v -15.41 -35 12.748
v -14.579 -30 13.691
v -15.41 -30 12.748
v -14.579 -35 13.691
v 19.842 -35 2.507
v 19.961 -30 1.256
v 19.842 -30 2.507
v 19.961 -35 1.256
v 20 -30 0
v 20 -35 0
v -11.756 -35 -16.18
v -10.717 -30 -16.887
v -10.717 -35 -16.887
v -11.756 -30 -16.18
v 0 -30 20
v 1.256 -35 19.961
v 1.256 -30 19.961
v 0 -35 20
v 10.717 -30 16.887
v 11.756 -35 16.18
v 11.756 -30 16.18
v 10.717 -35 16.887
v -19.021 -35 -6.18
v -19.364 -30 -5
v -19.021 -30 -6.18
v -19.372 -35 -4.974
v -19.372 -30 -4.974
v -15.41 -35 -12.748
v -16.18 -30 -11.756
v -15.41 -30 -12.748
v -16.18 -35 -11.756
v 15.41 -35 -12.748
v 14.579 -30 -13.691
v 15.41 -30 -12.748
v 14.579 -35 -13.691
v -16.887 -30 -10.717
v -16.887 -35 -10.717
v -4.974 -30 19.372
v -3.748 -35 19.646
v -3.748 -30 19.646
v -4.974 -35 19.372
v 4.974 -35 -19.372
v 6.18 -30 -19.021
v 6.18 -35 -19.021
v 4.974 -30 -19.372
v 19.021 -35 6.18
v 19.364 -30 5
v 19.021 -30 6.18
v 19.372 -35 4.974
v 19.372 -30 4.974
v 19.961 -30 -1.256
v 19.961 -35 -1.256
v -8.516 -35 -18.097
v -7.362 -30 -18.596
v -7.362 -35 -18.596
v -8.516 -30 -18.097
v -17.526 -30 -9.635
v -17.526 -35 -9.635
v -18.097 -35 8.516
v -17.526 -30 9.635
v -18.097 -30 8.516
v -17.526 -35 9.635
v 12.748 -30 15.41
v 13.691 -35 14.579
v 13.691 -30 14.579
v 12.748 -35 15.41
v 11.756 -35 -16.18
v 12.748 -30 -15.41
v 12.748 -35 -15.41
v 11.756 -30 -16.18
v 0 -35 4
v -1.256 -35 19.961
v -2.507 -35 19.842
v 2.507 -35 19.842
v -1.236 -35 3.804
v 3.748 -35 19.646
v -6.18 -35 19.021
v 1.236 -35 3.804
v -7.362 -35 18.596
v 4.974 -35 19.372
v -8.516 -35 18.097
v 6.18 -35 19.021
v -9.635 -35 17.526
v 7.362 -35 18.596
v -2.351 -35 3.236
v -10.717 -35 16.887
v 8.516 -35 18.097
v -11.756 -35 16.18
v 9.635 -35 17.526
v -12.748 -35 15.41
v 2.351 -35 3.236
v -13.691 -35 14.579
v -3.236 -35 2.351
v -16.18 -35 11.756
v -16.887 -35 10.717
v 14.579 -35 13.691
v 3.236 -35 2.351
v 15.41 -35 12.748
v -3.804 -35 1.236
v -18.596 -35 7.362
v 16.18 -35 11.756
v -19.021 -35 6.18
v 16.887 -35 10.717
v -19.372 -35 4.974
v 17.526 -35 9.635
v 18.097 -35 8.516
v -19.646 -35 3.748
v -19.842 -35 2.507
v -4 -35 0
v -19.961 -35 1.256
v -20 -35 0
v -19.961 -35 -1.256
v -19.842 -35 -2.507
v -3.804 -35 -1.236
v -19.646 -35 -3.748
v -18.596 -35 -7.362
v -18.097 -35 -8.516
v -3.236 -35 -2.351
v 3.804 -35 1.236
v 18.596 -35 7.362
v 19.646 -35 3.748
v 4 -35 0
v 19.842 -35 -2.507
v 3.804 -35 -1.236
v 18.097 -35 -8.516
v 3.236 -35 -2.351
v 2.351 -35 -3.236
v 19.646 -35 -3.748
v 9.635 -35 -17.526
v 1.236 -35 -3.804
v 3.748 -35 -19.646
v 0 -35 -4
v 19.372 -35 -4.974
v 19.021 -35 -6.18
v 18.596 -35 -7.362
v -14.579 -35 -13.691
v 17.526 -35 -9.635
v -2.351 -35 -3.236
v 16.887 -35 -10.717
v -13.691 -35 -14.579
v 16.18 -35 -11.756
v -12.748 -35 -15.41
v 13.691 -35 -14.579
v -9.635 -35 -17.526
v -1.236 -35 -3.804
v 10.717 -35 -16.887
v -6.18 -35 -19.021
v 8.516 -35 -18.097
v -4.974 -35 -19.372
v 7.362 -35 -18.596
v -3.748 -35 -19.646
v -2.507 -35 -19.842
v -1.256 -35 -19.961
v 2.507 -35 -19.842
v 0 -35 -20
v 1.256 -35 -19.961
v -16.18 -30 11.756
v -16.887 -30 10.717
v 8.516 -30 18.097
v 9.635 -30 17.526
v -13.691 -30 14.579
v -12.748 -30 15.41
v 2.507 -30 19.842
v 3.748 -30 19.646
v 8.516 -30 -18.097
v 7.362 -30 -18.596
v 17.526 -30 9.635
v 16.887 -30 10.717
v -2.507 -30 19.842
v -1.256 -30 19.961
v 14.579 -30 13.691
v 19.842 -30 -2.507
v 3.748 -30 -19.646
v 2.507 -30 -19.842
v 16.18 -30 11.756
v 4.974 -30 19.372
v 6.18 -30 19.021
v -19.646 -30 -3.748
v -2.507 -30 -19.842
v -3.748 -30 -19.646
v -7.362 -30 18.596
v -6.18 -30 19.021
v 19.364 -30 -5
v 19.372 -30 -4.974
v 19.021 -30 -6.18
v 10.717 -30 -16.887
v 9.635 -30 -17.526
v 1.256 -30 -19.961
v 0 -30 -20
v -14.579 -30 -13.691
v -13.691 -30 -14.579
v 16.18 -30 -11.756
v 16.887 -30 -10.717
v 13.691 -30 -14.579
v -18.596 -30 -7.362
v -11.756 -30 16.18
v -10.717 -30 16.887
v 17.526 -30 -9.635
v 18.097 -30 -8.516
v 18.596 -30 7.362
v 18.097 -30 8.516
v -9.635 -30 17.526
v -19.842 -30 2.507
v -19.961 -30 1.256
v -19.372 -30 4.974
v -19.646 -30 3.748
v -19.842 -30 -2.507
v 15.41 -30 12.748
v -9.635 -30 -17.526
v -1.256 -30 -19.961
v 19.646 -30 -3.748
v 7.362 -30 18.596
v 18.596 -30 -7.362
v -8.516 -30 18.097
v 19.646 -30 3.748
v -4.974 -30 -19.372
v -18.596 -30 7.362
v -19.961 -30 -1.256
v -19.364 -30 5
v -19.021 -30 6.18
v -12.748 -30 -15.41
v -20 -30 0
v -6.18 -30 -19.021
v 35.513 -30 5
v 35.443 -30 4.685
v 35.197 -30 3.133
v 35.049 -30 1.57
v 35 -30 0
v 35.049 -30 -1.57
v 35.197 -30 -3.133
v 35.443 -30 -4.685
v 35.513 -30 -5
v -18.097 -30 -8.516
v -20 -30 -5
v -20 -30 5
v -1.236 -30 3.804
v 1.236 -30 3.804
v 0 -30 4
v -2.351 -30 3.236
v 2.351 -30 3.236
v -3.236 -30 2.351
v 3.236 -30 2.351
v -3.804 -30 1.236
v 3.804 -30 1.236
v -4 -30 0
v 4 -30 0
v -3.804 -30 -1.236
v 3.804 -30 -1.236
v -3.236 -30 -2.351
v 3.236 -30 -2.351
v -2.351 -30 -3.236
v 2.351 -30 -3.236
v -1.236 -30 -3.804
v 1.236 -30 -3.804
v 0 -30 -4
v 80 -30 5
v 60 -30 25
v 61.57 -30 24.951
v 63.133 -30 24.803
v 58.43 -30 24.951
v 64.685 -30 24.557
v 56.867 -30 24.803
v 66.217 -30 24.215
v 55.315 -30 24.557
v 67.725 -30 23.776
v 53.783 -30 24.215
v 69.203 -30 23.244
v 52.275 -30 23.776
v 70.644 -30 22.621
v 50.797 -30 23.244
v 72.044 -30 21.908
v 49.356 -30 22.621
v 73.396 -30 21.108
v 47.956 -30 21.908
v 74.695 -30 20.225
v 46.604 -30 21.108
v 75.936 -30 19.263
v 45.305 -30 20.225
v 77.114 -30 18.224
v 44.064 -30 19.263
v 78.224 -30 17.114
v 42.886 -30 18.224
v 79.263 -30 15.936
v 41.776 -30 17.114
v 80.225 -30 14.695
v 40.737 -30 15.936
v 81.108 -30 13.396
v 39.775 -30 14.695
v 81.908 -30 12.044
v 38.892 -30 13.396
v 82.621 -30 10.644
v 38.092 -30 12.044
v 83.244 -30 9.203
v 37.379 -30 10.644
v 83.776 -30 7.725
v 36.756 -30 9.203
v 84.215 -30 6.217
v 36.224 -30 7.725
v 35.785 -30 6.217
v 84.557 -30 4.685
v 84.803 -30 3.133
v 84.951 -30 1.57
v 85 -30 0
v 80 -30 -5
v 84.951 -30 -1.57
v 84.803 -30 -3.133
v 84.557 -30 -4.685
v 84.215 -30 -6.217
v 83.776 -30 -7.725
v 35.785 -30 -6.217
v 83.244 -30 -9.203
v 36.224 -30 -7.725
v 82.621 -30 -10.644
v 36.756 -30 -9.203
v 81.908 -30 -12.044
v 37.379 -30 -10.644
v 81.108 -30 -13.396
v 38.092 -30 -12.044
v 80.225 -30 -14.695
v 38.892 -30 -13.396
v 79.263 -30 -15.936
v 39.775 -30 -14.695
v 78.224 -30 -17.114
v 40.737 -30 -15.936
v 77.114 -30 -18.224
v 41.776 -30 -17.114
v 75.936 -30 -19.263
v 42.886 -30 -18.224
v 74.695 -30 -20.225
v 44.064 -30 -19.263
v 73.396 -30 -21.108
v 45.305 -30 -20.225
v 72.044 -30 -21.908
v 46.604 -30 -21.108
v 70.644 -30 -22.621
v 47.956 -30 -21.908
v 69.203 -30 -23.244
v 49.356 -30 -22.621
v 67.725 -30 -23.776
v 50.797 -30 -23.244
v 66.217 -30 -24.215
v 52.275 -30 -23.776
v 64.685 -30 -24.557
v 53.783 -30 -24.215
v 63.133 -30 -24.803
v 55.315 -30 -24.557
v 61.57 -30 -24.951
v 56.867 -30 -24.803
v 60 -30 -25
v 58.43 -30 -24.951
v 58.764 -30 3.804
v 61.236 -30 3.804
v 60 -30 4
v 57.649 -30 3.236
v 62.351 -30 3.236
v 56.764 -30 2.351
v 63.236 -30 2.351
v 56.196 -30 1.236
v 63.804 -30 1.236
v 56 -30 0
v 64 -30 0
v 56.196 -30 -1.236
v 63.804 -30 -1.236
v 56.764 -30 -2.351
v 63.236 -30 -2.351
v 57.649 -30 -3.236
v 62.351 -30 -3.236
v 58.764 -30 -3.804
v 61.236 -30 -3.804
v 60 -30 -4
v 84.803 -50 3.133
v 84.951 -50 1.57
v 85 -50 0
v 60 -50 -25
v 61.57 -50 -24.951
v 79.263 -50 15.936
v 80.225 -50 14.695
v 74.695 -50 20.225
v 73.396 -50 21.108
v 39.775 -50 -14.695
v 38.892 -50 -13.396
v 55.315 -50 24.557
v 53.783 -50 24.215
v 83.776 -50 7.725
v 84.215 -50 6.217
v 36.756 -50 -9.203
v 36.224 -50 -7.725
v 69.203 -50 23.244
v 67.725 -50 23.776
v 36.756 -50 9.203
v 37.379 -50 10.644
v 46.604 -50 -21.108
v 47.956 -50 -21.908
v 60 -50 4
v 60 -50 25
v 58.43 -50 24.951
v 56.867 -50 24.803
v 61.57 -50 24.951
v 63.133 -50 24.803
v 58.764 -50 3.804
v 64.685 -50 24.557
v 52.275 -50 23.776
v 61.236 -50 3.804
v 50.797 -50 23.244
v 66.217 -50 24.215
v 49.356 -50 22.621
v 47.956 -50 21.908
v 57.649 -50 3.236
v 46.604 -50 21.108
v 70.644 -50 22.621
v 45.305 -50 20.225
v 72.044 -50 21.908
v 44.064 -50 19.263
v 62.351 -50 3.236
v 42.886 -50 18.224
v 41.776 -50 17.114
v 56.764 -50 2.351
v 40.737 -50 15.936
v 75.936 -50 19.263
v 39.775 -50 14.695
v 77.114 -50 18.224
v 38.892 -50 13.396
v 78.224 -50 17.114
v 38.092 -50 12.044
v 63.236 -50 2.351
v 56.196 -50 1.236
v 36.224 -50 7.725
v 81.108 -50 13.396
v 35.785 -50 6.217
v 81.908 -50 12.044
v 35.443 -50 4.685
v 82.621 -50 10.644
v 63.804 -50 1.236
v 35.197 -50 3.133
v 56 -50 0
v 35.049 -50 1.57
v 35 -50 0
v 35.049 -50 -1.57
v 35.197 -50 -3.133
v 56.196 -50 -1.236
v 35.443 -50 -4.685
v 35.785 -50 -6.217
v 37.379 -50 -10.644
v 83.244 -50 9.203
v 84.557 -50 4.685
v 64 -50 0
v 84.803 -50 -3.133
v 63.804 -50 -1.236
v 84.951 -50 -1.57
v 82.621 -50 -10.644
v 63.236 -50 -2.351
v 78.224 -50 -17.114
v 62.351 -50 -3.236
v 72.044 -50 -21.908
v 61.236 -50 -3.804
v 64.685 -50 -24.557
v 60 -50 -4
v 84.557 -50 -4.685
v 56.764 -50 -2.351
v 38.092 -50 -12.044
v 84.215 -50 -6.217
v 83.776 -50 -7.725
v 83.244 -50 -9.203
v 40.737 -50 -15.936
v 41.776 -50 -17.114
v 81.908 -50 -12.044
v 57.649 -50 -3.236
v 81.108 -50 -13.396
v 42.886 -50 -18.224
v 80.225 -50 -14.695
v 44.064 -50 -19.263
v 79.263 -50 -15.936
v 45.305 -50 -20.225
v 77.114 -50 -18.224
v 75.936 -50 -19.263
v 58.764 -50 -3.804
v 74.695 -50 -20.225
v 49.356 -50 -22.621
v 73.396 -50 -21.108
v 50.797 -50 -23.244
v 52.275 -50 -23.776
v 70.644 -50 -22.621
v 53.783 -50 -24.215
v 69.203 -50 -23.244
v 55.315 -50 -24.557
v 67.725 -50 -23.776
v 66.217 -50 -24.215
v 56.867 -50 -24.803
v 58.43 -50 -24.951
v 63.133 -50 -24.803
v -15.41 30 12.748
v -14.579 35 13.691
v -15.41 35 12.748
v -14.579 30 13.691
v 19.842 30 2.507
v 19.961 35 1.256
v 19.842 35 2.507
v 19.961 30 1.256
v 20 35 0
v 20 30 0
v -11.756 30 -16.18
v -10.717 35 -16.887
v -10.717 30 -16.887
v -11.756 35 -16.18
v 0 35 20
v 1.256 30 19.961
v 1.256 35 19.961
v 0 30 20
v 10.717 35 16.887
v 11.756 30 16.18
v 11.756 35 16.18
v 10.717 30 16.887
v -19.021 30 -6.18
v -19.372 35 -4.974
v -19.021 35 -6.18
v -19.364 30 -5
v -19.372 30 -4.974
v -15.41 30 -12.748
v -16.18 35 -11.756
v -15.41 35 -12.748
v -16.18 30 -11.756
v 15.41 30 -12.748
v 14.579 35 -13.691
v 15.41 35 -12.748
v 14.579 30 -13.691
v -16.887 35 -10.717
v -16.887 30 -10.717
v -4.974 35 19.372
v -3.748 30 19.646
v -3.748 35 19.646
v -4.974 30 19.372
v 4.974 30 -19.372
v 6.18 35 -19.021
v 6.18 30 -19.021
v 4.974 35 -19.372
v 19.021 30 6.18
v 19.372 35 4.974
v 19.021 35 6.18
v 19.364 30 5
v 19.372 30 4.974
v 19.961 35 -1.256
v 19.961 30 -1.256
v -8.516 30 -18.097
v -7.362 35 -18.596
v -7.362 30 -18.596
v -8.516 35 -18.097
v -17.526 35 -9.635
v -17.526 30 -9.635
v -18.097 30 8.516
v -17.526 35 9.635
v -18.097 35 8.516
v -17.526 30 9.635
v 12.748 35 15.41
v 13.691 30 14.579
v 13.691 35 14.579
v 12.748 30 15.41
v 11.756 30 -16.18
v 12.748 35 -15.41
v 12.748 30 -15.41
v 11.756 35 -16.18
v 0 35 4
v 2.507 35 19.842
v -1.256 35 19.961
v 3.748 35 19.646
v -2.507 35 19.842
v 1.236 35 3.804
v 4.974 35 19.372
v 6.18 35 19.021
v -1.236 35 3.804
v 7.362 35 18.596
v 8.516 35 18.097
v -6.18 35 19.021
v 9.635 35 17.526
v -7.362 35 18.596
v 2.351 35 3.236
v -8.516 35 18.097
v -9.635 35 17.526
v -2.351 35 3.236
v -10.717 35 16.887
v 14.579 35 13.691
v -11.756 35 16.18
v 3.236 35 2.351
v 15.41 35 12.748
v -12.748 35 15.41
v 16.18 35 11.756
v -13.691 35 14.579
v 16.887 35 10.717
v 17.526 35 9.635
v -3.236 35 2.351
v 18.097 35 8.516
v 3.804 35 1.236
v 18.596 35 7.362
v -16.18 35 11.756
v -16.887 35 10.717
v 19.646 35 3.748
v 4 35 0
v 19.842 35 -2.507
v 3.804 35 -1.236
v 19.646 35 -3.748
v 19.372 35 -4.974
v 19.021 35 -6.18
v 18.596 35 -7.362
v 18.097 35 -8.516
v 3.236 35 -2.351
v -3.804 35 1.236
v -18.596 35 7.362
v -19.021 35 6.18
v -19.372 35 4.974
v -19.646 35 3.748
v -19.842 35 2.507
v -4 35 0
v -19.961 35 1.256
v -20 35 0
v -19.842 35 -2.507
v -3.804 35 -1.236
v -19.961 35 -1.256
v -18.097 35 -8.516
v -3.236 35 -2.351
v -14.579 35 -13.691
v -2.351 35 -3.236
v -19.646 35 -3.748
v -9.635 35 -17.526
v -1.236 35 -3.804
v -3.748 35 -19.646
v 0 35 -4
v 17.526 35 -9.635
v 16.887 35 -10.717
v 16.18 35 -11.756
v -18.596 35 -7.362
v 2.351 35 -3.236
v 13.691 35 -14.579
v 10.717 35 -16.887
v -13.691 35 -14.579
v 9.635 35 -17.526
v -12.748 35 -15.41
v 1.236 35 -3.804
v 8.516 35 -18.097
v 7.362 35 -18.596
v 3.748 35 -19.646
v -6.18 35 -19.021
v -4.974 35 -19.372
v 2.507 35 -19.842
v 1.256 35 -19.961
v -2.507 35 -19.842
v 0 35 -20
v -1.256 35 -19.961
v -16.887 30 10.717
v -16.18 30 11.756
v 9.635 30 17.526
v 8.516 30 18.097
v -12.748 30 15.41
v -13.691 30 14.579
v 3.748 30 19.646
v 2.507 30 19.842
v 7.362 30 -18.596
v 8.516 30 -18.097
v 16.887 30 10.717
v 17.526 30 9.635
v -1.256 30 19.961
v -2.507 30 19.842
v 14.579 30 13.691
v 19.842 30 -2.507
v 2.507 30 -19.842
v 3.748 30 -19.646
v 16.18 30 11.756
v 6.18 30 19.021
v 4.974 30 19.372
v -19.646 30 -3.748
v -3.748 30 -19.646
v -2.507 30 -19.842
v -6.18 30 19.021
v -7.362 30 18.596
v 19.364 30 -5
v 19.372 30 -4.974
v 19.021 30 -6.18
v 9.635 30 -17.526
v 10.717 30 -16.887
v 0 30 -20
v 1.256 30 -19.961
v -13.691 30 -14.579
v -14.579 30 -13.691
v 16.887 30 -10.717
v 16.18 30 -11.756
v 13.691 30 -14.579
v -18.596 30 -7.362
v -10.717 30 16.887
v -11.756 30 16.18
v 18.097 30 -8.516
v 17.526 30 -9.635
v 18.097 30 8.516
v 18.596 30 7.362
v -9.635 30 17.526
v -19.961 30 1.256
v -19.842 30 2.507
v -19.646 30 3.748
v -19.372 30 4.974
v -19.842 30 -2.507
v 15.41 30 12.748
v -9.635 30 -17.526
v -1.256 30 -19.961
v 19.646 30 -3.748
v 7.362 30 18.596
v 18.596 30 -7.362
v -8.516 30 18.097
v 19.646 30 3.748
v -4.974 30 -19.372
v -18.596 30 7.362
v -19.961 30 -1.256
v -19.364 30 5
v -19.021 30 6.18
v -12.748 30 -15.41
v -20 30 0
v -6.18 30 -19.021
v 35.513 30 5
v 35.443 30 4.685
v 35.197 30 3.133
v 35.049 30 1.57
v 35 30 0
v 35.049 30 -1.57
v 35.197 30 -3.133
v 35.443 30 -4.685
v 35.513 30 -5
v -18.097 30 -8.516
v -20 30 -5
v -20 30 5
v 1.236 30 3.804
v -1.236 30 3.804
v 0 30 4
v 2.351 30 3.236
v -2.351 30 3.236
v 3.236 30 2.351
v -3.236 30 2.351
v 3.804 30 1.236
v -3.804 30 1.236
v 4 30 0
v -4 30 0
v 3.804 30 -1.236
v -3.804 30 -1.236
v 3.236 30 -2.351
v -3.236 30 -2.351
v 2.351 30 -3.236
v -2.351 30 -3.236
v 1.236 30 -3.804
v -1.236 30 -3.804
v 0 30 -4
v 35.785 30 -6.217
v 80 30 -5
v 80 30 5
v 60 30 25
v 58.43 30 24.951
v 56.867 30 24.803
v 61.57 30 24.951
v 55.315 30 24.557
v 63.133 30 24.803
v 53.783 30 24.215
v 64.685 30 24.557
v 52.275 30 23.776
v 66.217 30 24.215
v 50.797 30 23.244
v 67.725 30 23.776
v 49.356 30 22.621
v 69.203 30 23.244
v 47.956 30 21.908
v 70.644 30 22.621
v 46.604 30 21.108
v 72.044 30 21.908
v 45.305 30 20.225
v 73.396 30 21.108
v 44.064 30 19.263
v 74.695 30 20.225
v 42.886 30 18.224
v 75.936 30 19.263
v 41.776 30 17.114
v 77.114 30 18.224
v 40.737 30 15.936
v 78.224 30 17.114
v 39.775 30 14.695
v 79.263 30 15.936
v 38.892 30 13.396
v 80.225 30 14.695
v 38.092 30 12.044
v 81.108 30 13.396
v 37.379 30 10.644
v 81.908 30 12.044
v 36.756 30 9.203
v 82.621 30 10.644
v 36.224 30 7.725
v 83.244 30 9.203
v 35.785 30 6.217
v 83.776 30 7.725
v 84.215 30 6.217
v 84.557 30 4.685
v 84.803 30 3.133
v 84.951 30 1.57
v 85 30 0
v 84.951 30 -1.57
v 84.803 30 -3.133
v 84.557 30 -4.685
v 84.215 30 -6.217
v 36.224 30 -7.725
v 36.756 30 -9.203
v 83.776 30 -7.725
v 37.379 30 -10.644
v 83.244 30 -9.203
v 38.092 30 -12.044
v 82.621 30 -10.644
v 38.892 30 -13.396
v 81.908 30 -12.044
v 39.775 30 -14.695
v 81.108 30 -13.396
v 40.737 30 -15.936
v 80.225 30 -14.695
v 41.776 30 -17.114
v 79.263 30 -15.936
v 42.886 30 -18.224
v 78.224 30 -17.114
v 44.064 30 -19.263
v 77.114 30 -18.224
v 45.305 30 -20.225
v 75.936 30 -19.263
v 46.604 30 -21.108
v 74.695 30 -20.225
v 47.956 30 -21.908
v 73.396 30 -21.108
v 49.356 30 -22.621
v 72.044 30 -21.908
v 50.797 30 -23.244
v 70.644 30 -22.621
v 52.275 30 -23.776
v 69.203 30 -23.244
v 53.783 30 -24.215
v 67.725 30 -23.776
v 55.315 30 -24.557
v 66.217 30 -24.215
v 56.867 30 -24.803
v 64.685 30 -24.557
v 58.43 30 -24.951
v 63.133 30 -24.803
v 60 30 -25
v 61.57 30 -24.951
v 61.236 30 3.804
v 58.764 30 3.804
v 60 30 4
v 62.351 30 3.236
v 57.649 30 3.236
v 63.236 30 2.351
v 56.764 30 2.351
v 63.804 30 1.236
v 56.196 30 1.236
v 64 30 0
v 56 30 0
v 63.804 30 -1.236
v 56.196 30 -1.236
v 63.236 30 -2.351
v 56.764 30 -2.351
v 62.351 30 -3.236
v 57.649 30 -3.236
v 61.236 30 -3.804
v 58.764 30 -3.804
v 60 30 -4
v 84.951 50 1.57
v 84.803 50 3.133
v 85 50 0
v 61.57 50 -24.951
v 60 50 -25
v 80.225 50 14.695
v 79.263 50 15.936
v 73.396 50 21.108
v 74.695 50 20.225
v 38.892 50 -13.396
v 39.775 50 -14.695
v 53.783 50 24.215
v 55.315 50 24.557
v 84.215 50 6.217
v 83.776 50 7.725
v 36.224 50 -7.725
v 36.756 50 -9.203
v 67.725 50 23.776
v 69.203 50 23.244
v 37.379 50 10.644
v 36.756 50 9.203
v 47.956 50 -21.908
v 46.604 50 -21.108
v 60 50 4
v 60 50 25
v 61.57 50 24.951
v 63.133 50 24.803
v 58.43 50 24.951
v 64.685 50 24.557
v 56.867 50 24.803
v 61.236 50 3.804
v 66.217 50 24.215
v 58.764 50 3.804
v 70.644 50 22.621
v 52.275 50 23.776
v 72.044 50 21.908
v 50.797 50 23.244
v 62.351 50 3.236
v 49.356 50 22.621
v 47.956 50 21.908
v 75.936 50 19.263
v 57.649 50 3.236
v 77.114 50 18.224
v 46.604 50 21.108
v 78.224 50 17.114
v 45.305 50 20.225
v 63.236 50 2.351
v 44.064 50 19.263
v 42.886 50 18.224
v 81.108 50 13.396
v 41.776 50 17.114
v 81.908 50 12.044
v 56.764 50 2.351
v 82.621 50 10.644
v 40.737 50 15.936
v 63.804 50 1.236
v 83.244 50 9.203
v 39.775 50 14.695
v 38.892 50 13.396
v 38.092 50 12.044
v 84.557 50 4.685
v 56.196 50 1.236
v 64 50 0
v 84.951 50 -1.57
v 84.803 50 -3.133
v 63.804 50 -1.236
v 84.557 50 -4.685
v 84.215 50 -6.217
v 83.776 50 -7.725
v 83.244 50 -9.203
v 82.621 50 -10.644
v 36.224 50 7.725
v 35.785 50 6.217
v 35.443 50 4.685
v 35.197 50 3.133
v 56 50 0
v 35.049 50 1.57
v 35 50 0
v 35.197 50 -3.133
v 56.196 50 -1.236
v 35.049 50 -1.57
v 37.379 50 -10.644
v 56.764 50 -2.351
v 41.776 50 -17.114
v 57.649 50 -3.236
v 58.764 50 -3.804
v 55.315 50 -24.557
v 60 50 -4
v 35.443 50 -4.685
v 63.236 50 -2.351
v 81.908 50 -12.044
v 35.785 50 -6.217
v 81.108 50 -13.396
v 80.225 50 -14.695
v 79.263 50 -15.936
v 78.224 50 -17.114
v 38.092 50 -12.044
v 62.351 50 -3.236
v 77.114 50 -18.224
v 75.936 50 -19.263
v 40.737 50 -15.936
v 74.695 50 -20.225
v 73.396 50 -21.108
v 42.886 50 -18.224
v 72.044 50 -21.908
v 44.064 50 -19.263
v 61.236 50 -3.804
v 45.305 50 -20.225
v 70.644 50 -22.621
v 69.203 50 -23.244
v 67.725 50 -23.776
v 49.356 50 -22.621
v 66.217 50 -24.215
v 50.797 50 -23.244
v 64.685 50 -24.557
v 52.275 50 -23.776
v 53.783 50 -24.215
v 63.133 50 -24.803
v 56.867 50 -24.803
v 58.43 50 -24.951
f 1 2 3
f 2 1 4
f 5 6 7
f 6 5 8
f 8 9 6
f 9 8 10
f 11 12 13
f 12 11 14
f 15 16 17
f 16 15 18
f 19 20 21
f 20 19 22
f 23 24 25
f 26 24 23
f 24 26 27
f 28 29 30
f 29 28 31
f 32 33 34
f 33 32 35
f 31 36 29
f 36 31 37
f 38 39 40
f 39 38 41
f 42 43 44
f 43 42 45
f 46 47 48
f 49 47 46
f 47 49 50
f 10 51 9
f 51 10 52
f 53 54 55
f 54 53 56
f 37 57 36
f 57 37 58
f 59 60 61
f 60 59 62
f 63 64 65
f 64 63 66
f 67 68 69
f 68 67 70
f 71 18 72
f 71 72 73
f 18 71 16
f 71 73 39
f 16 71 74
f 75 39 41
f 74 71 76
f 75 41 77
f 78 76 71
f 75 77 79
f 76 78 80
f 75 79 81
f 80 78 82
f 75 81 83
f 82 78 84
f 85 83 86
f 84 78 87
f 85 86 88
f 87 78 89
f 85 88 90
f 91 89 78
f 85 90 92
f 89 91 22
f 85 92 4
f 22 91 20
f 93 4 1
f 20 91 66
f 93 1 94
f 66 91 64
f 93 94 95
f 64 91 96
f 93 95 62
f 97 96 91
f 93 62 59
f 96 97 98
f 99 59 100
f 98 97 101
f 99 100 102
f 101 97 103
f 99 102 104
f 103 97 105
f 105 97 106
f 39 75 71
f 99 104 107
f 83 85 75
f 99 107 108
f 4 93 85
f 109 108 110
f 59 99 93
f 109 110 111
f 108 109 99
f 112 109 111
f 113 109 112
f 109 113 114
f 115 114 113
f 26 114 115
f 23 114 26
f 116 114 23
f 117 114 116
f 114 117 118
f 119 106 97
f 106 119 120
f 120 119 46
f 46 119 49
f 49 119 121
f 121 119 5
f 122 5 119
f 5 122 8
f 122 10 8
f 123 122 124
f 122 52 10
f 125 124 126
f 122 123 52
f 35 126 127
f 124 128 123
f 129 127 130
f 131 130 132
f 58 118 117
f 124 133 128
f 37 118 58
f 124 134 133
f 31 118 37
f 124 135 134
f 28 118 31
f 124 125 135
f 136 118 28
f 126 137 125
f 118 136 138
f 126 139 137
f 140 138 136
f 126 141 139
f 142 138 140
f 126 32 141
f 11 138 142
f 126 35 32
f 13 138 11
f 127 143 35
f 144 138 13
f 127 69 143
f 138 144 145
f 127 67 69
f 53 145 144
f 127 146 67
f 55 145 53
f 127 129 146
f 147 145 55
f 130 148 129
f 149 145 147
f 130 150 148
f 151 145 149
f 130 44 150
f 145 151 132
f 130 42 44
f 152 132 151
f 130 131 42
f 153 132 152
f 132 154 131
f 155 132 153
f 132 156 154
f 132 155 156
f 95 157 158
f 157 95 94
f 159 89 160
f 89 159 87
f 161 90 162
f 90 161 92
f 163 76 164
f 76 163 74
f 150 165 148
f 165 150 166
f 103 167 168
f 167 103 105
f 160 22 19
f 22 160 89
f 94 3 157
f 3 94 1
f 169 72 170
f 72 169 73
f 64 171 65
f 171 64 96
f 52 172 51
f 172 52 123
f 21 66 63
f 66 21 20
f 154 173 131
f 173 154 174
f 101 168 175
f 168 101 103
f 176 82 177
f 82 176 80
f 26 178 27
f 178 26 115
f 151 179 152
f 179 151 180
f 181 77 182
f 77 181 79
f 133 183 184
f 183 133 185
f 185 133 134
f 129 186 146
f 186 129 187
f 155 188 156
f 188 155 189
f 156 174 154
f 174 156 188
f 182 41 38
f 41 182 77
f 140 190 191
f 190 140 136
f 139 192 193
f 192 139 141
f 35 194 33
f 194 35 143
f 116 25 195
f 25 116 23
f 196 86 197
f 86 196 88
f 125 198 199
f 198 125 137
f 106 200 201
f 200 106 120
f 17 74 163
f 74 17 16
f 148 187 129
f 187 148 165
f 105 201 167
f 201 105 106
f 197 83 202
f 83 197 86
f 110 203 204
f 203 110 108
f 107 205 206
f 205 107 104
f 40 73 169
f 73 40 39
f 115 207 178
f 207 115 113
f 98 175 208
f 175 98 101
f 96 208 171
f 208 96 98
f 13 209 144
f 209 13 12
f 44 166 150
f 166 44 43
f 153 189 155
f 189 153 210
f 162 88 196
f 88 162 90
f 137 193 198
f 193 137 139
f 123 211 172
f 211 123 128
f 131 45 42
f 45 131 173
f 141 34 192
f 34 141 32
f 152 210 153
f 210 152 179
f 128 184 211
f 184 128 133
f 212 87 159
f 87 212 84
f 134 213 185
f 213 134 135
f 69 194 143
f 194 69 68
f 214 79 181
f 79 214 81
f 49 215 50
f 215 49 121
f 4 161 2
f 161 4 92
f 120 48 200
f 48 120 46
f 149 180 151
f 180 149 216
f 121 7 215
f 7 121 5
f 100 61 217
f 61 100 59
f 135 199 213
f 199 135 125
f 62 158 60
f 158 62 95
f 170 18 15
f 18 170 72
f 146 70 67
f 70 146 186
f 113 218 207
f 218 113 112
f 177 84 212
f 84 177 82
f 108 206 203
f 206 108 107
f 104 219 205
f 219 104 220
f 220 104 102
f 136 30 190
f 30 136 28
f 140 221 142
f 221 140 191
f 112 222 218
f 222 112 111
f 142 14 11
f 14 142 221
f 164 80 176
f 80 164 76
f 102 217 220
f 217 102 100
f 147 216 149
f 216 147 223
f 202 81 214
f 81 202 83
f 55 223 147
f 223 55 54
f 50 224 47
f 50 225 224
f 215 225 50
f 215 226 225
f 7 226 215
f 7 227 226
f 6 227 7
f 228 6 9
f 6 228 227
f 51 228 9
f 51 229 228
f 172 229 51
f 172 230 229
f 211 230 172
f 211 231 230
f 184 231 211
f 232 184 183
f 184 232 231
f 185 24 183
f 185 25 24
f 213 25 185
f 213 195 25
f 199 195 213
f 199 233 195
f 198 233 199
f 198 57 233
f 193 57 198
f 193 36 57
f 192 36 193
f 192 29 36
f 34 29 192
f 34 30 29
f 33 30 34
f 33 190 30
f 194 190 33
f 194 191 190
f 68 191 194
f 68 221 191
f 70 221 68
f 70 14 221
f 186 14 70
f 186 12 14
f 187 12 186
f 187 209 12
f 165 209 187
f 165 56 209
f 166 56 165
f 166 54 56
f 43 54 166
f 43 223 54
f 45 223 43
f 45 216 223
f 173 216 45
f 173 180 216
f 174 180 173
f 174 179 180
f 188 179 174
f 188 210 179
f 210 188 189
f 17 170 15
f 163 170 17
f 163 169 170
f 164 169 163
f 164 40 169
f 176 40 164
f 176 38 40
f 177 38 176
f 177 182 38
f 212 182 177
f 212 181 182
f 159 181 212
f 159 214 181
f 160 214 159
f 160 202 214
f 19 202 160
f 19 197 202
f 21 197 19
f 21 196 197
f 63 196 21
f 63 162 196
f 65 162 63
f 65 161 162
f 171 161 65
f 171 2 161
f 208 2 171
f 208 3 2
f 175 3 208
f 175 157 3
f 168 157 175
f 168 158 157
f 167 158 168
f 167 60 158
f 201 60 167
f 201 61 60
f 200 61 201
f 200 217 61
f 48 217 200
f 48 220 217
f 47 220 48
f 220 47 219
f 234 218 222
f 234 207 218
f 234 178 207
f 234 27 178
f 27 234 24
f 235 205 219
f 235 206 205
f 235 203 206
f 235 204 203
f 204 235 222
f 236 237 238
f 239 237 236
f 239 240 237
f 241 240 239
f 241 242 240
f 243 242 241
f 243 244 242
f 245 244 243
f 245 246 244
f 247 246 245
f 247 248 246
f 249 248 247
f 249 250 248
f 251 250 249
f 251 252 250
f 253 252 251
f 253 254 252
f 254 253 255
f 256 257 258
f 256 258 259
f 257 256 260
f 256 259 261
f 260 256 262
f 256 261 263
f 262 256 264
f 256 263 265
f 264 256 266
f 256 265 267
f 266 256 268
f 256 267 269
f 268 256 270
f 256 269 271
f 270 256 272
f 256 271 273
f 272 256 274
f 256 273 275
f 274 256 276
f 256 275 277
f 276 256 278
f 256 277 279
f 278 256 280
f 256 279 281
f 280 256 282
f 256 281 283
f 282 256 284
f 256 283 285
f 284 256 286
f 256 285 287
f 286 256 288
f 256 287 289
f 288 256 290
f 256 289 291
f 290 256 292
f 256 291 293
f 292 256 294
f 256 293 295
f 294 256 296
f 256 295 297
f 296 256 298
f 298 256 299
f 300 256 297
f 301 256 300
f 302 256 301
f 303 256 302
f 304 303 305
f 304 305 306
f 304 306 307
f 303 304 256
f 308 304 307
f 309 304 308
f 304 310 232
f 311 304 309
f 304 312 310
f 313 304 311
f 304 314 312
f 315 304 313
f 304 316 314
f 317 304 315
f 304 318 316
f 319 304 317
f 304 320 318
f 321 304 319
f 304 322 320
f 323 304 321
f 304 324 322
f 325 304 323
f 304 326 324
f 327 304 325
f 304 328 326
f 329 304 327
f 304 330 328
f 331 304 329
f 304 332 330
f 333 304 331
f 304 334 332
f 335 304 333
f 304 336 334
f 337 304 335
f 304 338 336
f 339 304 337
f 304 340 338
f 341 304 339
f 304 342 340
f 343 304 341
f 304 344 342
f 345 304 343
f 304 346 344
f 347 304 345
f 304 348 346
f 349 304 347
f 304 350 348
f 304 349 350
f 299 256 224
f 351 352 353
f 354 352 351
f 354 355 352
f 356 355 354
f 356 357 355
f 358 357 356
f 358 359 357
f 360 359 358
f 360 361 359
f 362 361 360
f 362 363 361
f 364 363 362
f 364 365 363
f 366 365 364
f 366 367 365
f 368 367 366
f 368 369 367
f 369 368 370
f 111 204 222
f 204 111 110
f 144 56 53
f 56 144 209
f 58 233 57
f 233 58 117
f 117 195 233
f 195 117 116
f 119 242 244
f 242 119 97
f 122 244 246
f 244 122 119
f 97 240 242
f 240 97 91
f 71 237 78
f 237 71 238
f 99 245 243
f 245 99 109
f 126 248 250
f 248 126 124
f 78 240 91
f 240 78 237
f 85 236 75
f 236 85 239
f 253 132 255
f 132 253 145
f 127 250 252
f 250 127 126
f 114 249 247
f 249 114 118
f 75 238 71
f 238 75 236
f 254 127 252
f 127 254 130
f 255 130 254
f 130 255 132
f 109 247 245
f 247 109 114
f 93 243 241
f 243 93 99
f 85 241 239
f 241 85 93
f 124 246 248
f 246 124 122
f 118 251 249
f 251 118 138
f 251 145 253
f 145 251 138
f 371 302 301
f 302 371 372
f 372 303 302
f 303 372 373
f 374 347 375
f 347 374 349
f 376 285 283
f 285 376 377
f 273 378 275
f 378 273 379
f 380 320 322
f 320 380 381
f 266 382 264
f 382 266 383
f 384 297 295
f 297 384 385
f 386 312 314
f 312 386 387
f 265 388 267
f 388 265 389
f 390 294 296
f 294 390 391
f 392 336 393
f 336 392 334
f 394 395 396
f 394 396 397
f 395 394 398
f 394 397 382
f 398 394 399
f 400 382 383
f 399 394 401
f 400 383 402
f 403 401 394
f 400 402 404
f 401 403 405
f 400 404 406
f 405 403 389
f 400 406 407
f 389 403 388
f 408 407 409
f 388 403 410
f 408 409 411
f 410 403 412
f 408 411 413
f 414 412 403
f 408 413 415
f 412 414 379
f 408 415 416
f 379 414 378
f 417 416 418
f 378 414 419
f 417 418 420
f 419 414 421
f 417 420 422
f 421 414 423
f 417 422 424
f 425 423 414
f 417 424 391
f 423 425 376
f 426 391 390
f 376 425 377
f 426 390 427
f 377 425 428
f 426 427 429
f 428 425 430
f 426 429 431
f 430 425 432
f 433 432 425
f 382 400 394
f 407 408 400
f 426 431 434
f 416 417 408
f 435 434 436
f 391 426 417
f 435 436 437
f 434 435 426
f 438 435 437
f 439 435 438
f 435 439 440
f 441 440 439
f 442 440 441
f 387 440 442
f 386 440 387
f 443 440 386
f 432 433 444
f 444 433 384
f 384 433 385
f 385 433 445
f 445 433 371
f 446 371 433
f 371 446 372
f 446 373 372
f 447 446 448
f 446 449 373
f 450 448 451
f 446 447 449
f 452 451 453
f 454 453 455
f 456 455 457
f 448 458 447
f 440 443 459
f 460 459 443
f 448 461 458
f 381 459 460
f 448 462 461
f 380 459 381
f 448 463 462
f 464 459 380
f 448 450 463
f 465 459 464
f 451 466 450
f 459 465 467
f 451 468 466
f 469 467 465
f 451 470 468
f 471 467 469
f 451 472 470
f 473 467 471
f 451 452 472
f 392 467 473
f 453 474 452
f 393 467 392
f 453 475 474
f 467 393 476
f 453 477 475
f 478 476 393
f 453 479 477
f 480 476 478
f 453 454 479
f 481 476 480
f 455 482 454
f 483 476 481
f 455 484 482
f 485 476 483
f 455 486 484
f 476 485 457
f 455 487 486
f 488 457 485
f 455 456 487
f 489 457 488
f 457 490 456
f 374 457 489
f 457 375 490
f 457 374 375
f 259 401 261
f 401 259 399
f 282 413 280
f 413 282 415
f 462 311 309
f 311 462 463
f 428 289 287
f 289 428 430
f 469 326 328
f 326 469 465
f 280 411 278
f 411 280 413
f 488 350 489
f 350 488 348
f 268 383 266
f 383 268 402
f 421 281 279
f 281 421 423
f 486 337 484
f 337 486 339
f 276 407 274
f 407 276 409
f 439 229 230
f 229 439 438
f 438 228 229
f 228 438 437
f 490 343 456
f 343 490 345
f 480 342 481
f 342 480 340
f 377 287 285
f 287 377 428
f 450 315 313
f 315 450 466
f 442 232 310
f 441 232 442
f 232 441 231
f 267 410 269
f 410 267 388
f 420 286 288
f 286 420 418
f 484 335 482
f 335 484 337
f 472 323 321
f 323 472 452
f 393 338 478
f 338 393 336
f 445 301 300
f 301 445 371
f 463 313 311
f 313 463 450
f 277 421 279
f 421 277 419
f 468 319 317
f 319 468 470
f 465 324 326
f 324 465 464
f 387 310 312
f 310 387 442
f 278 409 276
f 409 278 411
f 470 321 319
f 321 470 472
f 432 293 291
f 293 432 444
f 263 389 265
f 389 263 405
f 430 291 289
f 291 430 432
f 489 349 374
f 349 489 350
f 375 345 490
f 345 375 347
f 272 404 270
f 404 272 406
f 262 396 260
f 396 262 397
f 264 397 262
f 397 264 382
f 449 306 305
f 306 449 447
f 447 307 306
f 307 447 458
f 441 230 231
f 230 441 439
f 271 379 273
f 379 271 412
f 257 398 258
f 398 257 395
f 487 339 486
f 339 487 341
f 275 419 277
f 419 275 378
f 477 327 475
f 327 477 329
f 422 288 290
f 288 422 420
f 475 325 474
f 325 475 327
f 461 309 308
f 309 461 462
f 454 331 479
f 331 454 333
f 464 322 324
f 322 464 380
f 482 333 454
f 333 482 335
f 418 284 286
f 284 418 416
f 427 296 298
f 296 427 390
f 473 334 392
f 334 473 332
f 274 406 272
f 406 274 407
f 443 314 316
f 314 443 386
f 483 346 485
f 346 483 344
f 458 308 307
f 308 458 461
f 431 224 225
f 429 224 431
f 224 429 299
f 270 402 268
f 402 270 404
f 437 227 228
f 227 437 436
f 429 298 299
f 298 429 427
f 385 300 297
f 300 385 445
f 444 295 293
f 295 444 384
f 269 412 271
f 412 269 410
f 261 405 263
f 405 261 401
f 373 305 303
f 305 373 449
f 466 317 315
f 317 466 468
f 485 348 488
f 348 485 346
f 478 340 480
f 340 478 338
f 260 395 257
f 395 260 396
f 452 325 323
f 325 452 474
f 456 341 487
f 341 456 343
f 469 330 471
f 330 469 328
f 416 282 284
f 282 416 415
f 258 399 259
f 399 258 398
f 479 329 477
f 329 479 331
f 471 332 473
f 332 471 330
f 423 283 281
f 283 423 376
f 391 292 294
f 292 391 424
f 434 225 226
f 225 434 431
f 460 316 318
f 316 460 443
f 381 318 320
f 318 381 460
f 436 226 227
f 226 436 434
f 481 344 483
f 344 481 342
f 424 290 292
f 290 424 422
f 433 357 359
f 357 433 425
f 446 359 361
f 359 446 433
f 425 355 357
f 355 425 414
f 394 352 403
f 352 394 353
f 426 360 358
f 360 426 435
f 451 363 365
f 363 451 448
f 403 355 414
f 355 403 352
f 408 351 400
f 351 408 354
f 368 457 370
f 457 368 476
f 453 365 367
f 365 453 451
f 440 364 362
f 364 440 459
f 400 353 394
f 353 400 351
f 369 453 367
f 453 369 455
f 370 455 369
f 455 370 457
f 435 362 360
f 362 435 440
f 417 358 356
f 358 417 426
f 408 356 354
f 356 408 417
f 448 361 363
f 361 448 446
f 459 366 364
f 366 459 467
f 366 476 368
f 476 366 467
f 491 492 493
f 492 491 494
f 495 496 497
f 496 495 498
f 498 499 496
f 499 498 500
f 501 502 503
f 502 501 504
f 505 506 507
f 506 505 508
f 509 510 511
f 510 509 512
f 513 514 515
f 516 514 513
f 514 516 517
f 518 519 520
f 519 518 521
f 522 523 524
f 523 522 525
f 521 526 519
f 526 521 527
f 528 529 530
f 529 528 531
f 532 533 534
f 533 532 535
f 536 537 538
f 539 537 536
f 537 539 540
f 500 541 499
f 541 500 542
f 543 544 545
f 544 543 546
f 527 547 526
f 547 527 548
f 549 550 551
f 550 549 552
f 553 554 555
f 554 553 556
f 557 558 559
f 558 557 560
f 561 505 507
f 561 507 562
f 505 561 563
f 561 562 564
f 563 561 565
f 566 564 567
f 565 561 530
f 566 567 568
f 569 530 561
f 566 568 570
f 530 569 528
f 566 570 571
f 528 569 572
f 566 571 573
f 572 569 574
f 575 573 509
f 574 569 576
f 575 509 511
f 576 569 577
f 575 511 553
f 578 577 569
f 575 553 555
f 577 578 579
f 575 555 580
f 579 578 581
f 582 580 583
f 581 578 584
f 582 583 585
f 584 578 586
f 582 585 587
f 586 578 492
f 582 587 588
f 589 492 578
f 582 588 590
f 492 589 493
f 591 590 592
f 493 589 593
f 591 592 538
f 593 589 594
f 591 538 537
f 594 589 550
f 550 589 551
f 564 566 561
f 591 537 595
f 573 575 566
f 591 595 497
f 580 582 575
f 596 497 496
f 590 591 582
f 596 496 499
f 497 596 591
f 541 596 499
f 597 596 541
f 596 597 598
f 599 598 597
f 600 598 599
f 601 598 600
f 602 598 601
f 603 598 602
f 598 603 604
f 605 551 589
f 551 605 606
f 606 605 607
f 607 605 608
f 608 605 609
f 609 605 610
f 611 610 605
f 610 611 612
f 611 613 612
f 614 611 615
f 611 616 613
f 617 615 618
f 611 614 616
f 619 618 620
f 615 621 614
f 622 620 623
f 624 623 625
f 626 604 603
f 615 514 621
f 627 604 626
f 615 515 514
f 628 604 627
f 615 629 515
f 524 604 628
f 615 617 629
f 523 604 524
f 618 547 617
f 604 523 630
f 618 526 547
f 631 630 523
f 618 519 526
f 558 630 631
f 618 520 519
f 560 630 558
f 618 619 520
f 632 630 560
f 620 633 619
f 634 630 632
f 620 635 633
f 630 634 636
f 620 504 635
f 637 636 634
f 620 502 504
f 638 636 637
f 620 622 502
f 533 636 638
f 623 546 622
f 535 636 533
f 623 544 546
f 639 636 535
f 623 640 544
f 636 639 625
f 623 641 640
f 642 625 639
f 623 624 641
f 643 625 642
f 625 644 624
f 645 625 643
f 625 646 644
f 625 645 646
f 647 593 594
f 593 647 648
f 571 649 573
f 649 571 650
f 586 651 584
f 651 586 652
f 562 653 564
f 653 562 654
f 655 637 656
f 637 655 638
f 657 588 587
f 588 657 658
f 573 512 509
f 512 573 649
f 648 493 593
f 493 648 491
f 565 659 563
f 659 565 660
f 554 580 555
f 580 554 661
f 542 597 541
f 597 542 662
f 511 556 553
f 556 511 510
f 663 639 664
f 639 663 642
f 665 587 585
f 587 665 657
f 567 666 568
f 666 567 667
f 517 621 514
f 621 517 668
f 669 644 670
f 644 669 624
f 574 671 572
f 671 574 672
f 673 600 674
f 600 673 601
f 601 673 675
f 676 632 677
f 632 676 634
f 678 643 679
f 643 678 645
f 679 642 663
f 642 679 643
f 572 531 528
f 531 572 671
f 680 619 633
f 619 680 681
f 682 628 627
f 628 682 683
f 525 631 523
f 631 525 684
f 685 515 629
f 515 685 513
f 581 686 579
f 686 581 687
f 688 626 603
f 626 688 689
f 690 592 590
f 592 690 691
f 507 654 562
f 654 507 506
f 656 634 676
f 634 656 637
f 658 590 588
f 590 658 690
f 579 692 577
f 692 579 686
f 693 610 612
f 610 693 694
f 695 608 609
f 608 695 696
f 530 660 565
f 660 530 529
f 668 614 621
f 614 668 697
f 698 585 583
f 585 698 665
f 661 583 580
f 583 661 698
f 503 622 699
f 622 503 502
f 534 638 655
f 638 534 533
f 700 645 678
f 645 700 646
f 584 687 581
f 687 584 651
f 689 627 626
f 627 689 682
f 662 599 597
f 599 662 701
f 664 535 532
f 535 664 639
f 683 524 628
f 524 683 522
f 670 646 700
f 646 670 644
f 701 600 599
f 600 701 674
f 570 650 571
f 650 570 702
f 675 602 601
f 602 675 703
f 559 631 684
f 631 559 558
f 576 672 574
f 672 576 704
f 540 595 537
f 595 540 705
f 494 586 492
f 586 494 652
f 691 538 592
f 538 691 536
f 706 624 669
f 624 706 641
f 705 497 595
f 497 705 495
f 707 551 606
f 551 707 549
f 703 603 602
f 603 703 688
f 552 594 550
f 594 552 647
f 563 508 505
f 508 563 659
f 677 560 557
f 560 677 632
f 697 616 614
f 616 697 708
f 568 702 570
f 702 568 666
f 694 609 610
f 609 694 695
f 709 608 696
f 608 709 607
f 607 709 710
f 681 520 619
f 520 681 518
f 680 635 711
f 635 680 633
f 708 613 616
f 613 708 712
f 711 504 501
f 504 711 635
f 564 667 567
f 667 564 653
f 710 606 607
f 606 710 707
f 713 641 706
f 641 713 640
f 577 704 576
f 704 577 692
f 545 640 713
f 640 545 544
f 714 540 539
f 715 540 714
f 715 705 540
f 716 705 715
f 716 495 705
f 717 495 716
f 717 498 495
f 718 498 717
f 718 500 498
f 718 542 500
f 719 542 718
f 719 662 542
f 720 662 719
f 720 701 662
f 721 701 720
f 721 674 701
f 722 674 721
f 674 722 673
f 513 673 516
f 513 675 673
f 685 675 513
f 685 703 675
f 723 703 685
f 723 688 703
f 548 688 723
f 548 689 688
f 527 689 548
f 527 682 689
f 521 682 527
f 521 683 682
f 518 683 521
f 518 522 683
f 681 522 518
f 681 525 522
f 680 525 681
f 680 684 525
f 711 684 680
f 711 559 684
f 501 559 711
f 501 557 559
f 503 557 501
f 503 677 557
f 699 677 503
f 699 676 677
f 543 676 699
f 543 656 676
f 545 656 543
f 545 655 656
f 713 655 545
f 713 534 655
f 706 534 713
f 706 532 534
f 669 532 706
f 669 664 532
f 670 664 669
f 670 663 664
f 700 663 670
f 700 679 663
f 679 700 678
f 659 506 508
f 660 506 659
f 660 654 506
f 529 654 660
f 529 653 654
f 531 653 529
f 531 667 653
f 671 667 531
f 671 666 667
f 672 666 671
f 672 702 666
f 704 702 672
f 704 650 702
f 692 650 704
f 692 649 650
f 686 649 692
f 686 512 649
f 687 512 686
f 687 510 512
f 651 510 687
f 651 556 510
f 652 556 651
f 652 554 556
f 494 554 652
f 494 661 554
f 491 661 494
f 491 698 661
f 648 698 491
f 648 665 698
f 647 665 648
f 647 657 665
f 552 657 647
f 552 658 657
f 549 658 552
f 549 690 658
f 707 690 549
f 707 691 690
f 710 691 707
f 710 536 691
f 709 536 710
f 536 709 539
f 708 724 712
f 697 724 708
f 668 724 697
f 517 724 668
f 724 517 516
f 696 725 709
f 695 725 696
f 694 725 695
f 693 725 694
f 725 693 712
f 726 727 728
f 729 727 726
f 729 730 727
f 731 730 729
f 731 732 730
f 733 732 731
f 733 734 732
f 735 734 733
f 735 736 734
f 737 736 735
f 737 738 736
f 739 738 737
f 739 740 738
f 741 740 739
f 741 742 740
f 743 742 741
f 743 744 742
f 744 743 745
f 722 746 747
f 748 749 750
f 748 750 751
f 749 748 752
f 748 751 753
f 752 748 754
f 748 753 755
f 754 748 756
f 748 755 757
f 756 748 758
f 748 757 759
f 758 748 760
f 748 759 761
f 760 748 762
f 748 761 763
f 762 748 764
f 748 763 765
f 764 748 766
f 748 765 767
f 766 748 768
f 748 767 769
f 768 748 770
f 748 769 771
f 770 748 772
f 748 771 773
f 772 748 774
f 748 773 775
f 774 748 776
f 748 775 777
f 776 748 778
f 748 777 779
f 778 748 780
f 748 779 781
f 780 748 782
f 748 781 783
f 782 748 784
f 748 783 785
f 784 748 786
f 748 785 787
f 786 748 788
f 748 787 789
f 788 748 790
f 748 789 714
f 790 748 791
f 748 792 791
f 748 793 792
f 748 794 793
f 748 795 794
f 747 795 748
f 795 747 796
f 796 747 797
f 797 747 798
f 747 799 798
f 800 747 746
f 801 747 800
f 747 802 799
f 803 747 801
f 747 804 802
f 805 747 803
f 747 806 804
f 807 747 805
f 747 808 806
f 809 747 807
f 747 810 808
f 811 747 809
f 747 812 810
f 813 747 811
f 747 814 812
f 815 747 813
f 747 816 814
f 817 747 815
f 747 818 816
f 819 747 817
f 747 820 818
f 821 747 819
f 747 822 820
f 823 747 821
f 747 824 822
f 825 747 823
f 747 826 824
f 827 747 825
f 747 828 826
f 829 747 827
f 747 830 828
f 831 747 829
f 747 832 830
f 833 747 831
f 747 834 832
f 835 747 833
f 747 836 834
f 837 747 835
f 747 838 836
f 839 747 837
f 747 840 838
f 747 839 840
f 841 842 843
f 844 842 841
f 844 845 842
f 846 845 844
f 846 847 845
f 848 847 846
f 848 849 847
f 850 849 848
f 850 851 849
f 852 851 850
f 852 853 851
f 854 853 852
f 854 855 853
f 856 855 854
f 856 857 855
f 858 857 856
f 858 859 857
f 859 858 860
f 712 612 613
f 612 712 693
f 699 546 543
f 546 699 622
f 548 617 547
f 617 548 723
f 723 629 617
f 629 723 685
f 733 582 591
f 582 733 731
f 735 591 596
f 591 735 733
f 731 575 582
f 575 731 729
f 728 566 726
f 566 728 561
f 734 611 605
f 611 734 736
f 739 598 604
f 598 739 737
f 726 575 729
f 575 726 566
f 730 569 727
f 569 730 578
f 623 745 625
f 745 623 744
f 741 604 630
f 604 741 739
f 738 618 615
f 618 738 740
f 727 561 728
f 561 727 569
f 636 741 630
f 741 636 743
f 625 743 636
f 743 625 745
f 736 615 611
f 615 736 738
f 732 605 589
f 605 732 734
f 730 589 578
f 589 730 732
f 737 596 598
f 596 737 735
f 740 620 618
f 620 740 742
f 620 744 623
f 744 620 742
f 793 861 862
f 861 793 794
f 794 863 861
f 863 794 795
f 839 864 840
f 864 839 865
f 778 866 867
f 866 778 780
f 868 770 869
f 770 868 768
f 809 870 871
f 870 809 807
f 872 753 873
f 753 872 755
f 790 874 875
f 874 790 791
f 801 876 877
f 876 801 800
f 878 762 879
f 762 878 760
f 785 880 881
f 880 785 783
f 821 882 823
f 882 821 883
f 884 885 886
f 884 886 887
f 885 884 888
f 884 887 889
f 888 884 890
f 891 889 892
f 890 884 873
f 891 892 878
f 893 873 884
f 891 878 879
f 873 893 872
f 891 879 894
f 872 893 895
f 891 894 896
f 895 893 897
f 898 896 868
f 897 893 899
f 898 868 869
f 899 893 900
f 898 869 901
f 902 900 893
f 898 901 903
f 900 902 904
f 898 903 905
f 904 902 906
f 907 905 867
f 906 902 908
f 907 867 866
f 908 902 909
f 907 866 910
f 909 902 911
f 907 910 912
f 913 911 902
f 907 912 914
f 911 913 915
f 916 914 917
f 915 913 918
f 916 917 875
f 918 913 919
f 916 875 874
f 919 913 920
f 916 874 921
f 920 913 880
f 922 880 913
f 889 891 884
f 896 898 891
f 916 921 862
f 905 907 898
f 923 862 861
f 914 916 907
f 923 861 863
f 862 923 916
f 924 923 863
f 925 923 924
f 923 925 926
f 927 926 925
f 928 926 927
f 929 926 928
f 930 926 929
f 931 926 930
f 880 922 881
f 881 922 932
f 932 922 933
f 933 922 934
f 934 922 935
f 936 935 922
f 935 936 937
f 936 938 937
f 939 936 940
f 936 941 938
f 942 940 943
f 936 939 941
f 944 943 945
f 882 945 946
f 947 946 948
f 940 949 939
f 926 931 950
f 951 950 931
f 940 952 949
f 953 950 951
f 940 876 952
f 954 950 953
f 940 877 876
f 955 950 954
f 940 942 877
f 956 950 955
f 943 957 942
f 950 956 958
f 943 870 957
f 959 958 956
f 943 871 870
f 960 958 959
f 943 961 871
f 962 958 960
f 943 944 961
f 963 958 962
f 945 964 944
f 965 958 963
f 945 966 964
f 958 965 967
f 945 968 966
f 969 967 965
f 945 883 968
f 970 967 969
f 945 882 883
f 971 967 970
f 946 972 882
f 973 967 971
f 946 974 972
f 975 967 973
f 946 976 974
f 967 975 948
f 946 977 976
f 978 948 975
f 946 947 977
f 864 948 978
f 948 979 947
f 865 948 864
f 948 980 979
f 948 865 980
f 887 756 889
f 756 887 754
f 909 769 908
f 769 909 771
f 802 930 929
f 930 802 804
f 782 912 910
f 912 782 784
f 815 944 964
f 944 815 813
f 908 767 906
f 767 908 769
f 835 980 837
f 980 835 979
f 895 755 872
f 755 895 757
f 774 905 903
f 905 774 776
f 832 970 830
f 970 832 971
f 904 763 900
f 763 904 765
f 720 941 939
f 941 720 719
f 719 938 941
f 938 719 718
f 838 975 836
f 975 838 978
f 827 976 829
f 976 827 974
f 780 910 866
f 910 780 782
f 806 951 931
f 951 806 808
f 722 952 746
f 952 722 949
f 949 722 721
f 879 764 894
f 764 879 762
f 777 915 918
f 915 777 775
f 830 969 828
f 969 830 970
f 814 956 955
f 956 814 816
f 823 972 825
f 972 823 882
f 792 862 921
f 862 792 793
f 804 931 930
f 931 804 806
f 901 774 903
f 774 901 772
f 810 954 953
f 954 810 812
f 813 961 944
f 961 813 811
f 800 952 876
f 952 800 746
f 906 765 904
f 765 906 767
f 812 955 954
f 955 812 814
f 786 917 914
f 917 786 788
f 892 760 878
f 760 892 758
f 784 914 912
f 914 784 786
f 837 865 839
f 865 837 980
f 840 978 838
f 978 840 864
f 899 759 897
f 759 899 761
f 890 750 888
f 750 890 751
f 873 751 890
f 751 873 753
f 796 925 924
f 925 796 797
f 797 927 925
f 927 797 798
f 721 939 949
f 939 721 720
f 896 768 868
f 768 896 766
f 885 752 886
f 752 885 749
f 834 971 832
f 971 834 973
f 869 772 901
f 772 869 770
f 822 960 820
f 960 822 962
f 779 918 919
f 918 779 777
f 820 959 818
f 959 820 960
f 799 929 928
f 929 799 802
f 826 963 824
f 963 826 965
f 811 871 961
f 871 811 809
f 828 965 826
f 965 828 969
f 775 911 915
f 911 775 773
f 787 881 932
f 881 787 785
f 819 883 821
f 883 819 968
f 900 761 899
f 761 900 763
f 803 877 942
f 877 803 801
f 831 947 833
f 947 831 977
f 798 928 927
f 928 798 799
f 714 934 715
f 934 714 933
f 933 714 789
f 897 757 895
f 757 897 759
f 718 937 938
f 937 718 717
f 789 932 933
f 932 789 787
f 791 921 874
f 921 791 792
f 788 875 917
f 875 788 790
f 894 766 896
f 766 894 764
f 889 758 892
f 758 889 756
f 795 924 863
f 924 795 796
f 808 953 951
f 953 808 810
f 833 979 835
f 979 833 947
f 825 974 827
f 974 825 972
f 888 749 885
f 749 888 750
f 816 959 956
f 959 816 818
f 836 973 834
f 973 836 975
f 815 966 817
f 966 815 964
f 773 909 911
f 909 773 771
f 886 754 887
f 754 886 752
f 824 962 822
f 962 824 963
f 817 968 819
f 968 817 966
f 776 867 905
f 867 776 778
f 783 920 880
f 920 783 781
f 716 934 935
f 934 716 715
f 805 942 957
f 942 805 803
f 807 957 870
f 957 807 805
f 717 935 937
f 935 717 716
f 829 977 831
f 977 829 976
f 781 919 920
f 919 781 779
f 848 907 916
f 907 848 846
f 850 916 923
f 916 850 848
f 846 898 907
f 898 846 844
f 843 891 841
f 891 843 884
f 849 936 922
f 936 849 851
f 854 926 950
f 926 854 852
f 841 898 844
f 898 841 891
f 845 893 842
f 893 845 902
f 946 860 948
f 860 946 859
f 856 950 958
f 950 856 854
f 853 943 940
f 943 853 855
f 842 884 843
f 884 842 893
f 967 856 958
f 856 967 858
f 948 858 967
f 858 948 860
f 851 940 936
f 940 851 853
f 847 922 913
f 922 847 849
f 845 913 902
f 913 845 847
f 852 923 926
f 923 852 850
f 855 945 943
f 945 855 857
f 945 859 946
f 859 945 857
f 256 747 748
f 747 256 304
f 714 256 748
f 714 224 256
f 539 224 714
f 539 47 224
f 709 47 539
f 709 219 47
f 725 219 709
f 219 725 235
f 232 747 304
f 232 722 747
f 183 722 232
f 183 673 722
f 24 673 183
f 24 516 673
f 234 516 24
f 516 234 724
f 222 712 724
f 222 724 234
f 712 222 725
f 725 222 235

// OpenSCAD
// file: rueda_simple.scad
module rueda_simple(grosor=5, diametro=40, diam_eje=8)
{
  //-- Construcción de la rueda a partir de
  //-- los parámetros
  difference() {
    //-- Base de la rueda
    cylinder(r=diametro/2, h=grosor,$fn=100);

    //-- Taladro del eje
    cylinder(r=diam_eje/2, h=3*grosor,$fn=20,center=true);
  }
}

//-- Ejemplos de uso del modulo
//-- Rueda por defecto
rueda_simple();

translate([-50,0,0])
  rueda_simple(grosor=20);

translate([50,0,0])
  rueda_simple(grosor=20, diametro=20);
// main file
//----------------------------------------------------------
//-- Tutorial OpenScad
//-- Juan Gonzalez-Gomez (Obijuan) juan@iearobotics.com
//----------------------------------------------------------
//-- (c) Mayo, 2012
//-- Licencia GPL
//----------------------------------------------------------
//-- Ejemplo sencillo de como utilizar los modulos
//-- Construccion de un coche simple
//----------------------------------------------------------

use <rueda_simple.scad>

//-- Chasis del cohe
translate([30,0,0])
cube([100,60,10],center=true);

//-- Rueda delantera izquierda
translate([0,-30,0])
  rotate([90,0,0])
    rueda_simple();

//-- Rueda trasera izquierda
translate([60,-30,0])
  rotate([90,0,0])
    rueda_simple(grosor=20, diametro=50);

//-- Lado derecho del coche. Es simetrico con respecto
//-- al izquierdo
mirror([0,1,0]) {
  //-- Rueda delantera derecha
  translate([0,-30,0])
    rotate([90,0,0])
      rueda_simple();

  //-- Rueda trasera derecha
  translate([60,-30,0])
    rotate([90,0,0])
      rueda_simple(grosor=20, diametro=50);
}
